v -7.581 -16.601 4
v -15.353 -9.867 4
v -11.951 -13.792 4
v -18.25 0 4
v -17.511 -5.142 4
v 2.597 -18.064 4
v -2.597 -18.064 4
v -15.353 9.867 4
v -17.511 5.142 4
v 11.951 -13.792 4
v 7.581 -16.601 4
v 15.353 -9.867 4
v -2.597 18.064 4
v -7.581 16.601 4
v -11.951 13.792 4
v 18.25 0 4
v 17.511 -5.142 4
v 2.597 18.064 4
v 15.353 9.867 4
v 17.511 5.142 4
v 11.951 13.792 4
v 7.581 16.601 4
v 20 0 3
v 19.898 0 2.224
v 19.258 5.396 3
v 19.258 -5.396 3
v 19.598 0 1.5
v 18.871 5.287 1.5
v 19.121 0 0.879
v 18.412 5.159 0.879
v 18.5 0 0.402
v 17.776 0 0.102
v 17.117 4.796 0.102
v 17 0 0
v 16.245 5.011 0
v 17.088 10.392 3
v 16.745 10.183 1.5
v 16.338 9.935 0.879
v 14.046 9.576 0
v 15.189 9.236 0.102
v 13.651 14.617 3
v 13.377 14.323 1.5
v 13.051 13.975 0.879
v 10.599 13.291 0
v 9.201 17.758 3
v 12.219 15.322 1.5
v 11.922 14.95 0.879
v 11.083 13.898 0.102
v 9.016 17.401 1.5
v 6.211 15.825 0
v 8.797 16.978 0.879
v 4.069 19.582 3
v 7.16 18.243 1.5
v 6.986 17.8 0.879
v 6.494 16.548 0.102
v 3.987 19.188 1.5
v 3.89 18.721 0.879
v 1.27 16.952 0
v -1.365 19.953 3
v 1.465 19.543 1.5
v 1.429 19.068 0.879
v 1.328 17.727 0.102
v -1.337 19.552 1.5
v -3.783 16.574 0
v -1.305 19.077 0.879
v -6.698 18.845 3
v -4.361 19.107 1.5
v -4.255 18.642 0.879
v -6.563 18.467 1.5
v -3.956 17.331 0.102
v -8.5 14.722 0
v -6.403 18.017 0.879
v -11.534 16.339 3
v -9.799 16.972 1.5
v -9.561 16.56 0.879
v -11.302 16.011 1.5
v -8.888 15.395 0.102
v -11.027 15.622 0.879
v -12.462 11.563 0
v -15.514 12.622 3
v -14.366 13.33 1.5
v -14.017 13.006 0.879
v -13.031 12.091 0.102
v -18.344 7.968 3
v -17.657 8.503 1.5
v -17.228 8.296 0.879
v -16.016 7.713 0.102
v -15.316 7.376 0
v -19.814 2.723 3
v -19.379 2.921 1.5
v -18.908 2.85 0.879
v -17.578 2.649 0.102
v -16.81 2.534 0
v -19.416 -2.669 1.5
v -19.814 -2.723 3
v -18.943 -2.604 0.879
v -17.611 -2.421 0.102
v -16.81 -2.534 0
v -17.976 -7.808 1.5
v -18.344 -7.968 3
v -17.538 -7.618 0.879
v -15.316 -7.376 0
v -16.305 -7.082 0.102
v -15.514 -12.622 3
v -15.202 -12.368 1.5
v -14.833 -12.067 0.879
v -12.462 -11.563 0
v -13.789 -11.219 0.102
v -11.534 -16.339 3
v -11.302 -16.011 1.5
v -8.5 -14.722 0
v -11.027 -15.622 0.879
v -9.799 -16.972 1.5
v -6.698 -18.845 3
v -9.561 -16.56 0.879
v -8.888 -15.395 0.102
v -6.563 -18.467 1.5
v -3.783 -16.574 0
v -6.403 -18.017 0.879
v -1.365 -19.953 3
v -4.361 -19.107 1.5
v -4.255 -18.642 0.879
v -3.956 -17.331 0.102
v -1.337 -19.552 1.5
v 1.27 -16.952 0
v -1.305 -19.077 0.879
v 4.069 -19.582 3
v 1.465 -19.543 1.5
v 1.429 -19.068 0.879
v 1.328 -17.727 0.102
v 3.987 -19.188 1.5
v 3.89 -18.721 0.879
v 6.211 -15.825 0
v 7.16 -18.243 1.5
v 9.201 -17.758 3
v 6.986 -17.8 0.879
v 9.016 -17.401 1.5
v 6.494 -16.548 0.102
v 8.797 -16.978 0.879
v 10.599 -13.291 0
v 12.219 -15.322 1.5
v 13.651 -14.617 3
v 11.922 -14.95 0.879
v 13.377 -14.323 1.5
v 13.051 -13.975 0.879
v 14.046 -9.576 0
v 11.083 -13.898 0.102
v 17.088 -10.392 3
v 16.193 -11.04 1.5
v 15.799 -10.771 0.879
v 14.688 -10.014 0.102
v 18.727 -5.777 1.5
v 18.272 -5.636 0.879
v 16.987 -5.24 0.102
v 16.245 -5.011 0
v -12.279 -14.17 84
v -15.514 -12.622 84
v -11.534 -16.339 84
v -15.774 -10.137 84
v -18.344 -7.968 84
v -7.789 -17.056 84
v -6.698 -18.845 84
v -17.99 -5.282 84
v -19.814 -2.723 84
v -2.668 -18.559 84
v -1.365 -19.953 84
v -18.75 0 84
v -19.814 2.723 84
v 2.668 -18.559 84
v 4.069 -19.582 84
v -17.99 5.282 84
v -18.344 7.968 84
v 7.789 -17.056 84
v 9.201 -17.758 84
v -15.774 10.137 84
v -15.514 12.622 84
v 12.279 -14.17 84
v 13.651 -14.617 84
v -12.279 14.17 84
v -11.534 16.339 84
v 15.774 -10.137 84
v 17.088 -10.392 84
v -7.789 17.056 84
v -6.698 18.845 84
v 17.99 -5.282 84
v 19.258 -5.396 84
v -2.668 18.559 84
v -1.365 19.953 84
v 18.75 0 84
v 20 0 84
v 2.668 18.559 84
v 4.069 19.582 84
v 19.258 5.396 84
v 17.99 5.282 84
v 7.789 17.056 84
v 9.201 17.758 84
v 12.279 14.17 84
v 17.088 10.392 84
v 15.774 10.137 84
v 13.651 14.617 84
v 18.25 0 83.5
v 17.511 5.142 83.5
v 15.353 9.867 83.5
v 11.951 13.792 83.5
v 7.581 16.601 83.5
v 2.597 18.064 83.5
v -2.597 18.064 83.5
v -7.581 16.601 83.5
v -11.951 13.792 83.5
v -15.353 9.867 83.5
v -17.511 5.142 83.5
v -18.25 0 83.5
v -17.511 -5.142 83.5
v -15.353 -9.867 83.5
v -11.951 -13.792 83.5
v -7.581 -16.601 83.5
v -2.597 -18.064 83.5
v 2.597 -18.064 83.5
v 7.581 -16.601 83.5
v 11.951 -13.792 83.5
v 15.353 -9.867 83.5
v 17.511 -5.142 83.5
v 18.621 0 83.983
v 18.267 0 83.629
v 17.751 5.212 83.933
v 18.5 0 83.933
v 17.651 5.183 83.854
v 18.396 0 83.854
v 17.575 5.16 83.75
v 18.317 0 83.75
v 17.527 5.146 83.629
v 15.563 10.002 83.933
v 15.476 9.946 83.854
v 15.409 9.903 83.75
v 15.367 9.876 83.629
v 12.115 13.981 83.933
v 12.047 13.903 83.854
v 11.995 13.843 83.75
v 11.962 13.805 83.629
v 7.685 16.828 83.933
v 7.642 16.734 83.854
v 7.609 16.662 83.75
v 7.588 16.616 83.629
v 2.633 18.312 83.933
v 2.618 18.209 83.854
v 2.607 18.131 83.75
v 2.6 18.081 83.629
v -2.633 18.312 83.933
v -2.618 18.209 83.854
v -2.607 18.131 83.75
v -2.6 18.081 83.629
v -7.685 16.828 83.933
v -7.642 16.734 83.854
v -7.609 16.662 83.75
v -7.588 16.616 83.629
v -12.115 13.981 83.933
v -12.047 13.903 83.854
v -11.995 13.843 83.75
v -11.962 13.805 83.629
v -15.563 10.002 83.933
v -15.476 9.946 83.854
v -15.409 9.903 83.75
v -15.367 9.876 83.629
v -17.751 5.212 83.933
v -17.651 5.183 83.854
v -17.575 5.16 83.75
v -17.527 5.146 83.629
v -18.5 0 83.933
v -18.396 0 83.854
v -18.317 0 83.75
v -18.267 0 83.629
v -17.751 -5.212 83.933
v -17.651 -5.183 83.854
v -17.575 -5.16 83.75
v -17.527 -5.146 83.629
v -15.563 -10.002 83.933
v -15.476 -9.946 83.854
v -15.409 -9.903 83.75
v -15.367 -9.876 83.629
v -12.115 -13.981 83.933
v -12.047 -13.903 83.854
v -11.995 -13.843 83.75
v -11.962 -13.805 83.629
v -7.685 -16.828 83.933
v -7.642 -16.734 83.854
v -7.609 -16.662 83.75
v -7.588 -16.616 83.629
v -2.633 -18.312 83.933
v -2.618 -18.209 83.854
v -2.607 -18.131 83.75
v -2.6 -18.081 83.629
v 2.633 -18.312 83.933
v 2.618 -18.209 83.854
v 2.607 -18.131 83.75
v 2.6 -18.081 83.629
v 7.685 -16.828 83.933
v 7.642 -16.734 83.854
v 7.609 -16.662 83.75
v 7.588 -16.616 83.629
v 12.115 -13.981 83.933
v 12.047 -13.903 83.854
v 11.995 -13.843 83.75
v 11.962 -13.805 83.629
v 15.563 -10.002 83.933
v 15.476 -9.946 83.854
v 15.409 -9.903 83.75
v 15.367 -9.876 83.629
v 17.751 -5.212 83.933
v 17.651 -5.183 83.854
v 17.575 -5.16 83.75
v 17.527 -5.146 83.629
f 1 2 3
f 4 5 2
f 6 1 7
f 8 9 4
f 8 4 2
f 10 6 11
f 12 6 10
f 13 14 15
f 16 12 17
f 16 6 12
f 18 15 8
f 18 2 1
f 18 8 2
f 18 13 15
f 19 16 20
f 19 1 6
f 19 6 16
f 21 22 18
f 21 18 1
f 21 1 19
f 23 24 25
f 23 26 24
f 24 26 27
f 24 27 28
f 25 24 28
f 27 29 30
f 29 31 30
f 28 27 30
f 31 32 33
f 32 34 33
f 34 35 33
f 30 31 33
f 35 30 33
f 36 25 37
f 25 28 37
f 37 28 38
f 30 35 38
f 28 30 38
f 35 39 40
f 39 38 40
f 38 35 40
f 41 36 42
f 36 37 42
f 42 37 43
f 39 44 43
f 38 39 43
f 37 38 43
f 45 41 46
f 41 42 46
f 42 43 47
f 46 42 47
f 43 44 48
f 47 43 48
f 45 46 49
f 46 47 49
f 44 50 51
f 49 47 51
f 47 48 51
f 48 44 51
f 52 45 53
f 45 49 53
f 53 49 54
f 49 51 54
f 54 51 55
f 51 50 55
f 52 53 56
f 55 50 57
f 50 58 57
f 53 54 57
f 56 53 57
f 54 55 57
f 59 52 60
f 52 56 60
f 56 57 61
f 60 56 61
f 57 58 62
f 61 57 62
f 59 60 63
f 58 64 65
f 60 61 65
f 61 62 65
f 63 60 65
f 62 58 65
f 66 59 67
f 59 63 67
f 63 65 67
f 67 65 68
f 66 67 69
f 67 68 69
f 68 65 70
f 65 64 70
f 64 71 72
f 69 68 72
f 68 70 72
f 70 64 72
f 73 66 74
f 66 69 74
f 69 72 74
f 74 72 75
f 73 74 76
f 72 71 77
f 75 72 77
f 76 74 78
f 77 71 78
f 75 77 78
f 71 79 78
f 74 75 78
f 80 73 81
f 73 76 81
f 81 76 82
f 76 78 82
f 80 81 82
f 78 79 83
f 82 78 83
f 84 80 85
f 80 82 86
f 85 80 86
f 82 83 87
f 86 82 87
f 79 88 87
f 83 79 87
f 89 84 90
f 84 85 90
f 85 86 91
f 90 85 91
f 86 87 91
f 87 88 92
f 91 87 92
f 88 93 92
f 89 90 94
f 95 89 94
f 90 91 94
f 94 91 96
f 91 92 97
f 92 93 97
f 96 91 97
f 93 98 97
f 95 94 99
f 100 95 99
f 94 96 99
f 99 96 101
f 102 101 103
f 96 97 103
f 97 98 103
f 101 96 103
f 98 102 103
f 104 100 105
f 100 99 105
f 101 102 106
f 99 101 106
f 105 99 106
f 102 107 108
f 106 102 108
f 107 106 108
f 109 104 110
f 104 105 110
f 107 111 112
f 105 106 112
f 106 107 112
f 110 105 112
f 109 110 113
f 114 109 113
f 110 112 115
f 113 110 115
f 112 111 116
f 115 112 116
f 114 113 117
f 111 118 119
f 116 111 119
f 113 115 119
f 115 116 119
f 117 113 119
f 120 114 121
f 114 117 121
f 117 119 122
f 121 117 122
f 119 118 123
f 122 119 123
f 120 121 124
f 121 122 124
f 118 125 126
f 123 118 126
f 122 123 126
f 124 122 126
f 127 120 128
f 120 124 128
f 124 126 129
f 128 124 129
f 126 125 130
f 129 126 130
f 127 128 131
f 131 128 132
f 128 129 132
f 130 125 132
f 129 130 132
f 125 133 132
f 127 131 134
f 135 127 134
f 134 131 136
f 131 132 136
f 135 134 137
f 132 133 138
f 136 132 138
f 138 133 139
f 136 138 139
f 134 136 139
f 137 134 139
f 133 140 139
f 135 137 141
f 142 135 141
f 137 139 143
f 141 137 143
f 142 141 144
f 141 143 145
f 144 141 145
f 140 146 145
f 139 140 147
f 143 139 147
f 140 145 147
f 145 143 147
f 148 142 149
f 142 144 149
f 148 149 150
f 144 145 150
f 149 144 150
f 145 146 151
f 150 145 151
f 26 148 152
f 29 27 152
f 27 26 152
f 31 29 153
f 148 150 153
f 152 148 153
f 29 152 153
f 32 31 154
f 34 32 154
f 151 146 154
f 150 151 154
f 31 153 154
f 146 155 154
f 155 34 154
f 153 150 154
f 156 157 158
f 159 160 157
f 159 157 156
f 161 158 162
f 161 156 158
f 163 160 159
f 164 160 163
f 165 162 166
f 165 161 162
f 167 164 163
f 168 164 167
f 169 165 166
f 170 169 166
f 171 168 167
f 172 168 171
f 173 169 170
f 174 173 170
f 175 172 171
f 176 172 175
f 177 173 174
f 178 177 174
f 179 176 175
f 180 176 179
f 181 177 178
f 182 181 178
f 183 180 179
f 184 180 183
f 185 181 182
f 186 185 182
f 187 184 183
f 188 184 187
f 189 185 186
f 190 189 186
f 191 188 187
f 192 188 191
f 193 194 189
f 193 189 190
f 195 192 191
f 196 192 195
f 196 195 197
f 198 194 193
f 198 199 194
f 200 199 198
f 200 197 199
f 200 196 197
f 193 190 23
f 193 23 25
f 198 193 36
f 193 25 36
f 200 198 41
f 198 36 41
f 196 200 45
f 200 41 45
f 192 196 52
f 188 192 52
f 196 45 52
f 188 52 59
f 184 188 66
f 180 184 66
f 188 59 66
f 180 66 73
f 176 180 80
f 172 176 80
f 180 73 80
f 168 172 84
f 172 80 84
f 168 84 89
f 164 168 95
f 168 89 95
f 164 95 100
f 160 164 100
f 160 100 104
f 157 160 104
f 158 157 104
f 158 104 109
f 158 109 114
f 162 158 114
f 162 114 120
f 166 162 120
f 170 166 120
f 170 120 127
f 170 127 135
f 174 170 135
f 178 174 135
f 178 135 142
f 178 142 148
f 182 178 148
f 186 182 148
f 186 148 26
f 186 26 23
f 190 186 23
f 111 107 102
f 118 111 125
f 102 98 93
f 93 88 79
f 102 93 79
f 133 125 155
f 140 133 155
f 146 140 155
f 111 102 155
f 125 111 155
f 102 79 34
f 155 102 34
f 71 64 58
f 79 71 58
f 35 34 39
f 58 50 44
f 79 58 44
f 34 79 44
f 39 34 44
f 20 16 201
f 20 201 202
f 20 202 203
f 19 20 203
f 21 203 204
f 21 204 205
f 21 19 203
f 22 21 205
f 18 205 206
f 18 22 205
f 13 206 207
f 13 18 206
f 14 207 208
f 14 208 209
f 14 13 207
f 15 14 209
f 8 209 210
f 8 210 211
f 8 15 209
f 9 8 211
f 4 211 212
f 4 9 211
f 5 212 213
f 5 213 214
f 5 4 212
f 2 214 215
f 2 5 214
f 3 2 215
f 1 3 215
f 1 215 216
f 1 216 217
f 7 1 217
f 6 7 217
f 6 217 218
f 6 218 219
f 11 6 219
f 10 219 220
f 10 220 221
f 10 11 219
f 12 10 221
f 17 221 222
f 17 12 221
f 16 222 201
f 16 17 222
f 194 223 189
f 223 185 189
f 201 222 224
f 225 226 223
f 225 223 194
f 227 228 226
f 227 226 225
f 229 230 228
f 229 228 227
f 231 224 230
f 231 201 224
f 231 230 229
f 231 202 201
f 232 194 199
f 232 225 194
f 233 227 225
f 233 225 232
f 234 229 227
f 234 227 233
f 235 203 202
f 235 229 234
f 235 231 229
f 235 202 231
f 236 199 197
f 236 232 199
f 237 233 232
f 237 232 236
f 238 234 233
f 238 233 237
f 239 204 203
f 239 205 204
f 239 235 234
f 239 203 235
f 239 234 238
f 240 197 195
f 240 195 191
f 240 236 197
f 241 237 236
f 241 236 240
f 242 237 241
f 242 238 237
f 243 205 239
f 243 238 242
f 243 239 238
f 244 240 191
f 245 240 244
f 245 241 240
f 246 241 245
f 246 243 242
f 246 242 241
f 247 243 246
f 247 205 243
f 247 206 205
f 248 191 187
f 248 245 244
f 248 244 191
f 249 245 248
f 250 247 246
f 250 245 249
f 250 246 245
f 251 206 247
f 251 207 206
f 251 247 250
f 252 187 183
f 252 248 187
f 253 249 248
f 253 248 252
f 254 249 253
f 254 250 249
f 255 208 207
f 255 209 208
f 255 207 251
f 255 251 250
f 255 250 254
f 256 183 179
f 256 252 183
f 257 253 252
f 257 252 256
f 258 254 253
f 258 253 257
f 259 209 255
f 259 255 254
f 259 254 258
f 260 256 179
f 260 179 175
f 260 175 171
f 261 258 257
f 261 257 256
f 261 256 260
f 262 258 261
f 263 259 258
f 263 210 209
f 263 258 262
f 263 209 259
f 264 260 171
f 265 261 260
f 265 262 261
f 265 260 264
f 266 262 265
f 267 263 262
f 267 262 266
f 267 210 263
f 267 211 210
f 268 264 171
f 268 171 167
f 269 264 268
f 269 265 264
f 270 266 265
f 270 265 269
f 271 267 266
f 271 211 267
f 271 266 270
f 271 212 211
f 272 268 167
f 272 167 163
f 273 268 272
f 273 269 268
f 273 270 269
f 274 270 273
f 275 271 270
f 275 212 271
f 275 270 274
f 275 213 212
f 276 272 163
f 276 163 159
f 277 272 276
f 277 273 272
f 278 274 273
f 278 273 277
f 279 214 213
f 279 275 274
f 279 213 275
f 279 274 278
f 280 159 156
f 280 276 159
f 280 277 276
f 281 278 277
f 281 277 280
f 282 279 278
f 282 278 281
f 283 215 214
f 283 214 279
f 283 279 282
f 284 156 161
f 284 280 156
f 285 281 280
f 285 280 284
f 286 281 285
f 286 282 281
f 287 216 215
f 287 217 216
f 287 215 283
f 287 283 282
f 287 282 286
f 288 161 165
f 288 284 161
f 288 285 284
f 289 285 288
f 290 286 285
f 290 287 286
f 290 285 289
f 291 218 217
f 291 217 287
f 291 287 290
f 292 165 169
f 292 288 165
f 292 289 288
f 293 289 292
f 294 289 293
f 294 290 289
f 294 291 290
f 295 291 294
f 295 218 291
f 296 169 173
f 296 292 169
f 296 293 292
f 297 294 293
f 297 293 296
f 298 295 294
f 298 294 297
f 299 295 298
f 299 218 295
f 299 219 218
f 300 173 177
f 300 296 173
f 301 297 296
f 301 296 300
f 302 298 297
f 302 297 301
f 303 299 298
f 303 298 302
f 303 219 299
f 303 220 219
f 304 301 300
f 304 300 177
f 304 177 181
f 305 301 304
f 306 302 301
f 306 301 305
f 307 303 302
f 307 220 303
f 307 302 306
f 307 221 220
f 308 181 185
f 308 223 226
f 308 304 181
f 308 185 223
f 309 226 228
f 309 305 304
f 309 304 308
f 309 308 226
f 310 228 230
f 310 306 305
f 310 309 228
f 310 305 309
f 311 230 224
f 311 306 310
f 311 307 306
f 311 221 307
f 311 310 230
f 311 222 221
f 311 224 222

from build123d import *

# Parameters (mm, degrees)
F0_R     = 20
F1_DEPTH = 4
F2_R     = 20
F2_R_2   = 18.25
F3_DEPTH = 80
F4_R     = 0.5
F5_R     = 3


with BuildPart() as f1:
    # F0 (on Top) → F1 (new body)
    with BuildSketch(Plane.XY):
        Circle(F0_R)
    extrude(amount=F1_DEPTH)

    # F2 (on face) → F3 (join)
    with BuildSketch(Plane.XY.offset(4)):
        Circle(F2_R)
        Circle(F2_R_2, mode=Mode.SUBTRACT)
    extrude(amount=F3_DEPTH)

    # F4
    f4_edges = [f1.edges().sort_by_distance(p)[0] for p in [
        (-18.25, 0, 84),
    ]]
    fillet(f4_edges, radius=F4_R)

    # F5
    f5_edges = [f1.edges().sort_by_distance(p)[0] for p in [
        (-20, 0, 0),
    ]]
    fillet(f5_edges, radius=F5_R)


solid = f1.part
